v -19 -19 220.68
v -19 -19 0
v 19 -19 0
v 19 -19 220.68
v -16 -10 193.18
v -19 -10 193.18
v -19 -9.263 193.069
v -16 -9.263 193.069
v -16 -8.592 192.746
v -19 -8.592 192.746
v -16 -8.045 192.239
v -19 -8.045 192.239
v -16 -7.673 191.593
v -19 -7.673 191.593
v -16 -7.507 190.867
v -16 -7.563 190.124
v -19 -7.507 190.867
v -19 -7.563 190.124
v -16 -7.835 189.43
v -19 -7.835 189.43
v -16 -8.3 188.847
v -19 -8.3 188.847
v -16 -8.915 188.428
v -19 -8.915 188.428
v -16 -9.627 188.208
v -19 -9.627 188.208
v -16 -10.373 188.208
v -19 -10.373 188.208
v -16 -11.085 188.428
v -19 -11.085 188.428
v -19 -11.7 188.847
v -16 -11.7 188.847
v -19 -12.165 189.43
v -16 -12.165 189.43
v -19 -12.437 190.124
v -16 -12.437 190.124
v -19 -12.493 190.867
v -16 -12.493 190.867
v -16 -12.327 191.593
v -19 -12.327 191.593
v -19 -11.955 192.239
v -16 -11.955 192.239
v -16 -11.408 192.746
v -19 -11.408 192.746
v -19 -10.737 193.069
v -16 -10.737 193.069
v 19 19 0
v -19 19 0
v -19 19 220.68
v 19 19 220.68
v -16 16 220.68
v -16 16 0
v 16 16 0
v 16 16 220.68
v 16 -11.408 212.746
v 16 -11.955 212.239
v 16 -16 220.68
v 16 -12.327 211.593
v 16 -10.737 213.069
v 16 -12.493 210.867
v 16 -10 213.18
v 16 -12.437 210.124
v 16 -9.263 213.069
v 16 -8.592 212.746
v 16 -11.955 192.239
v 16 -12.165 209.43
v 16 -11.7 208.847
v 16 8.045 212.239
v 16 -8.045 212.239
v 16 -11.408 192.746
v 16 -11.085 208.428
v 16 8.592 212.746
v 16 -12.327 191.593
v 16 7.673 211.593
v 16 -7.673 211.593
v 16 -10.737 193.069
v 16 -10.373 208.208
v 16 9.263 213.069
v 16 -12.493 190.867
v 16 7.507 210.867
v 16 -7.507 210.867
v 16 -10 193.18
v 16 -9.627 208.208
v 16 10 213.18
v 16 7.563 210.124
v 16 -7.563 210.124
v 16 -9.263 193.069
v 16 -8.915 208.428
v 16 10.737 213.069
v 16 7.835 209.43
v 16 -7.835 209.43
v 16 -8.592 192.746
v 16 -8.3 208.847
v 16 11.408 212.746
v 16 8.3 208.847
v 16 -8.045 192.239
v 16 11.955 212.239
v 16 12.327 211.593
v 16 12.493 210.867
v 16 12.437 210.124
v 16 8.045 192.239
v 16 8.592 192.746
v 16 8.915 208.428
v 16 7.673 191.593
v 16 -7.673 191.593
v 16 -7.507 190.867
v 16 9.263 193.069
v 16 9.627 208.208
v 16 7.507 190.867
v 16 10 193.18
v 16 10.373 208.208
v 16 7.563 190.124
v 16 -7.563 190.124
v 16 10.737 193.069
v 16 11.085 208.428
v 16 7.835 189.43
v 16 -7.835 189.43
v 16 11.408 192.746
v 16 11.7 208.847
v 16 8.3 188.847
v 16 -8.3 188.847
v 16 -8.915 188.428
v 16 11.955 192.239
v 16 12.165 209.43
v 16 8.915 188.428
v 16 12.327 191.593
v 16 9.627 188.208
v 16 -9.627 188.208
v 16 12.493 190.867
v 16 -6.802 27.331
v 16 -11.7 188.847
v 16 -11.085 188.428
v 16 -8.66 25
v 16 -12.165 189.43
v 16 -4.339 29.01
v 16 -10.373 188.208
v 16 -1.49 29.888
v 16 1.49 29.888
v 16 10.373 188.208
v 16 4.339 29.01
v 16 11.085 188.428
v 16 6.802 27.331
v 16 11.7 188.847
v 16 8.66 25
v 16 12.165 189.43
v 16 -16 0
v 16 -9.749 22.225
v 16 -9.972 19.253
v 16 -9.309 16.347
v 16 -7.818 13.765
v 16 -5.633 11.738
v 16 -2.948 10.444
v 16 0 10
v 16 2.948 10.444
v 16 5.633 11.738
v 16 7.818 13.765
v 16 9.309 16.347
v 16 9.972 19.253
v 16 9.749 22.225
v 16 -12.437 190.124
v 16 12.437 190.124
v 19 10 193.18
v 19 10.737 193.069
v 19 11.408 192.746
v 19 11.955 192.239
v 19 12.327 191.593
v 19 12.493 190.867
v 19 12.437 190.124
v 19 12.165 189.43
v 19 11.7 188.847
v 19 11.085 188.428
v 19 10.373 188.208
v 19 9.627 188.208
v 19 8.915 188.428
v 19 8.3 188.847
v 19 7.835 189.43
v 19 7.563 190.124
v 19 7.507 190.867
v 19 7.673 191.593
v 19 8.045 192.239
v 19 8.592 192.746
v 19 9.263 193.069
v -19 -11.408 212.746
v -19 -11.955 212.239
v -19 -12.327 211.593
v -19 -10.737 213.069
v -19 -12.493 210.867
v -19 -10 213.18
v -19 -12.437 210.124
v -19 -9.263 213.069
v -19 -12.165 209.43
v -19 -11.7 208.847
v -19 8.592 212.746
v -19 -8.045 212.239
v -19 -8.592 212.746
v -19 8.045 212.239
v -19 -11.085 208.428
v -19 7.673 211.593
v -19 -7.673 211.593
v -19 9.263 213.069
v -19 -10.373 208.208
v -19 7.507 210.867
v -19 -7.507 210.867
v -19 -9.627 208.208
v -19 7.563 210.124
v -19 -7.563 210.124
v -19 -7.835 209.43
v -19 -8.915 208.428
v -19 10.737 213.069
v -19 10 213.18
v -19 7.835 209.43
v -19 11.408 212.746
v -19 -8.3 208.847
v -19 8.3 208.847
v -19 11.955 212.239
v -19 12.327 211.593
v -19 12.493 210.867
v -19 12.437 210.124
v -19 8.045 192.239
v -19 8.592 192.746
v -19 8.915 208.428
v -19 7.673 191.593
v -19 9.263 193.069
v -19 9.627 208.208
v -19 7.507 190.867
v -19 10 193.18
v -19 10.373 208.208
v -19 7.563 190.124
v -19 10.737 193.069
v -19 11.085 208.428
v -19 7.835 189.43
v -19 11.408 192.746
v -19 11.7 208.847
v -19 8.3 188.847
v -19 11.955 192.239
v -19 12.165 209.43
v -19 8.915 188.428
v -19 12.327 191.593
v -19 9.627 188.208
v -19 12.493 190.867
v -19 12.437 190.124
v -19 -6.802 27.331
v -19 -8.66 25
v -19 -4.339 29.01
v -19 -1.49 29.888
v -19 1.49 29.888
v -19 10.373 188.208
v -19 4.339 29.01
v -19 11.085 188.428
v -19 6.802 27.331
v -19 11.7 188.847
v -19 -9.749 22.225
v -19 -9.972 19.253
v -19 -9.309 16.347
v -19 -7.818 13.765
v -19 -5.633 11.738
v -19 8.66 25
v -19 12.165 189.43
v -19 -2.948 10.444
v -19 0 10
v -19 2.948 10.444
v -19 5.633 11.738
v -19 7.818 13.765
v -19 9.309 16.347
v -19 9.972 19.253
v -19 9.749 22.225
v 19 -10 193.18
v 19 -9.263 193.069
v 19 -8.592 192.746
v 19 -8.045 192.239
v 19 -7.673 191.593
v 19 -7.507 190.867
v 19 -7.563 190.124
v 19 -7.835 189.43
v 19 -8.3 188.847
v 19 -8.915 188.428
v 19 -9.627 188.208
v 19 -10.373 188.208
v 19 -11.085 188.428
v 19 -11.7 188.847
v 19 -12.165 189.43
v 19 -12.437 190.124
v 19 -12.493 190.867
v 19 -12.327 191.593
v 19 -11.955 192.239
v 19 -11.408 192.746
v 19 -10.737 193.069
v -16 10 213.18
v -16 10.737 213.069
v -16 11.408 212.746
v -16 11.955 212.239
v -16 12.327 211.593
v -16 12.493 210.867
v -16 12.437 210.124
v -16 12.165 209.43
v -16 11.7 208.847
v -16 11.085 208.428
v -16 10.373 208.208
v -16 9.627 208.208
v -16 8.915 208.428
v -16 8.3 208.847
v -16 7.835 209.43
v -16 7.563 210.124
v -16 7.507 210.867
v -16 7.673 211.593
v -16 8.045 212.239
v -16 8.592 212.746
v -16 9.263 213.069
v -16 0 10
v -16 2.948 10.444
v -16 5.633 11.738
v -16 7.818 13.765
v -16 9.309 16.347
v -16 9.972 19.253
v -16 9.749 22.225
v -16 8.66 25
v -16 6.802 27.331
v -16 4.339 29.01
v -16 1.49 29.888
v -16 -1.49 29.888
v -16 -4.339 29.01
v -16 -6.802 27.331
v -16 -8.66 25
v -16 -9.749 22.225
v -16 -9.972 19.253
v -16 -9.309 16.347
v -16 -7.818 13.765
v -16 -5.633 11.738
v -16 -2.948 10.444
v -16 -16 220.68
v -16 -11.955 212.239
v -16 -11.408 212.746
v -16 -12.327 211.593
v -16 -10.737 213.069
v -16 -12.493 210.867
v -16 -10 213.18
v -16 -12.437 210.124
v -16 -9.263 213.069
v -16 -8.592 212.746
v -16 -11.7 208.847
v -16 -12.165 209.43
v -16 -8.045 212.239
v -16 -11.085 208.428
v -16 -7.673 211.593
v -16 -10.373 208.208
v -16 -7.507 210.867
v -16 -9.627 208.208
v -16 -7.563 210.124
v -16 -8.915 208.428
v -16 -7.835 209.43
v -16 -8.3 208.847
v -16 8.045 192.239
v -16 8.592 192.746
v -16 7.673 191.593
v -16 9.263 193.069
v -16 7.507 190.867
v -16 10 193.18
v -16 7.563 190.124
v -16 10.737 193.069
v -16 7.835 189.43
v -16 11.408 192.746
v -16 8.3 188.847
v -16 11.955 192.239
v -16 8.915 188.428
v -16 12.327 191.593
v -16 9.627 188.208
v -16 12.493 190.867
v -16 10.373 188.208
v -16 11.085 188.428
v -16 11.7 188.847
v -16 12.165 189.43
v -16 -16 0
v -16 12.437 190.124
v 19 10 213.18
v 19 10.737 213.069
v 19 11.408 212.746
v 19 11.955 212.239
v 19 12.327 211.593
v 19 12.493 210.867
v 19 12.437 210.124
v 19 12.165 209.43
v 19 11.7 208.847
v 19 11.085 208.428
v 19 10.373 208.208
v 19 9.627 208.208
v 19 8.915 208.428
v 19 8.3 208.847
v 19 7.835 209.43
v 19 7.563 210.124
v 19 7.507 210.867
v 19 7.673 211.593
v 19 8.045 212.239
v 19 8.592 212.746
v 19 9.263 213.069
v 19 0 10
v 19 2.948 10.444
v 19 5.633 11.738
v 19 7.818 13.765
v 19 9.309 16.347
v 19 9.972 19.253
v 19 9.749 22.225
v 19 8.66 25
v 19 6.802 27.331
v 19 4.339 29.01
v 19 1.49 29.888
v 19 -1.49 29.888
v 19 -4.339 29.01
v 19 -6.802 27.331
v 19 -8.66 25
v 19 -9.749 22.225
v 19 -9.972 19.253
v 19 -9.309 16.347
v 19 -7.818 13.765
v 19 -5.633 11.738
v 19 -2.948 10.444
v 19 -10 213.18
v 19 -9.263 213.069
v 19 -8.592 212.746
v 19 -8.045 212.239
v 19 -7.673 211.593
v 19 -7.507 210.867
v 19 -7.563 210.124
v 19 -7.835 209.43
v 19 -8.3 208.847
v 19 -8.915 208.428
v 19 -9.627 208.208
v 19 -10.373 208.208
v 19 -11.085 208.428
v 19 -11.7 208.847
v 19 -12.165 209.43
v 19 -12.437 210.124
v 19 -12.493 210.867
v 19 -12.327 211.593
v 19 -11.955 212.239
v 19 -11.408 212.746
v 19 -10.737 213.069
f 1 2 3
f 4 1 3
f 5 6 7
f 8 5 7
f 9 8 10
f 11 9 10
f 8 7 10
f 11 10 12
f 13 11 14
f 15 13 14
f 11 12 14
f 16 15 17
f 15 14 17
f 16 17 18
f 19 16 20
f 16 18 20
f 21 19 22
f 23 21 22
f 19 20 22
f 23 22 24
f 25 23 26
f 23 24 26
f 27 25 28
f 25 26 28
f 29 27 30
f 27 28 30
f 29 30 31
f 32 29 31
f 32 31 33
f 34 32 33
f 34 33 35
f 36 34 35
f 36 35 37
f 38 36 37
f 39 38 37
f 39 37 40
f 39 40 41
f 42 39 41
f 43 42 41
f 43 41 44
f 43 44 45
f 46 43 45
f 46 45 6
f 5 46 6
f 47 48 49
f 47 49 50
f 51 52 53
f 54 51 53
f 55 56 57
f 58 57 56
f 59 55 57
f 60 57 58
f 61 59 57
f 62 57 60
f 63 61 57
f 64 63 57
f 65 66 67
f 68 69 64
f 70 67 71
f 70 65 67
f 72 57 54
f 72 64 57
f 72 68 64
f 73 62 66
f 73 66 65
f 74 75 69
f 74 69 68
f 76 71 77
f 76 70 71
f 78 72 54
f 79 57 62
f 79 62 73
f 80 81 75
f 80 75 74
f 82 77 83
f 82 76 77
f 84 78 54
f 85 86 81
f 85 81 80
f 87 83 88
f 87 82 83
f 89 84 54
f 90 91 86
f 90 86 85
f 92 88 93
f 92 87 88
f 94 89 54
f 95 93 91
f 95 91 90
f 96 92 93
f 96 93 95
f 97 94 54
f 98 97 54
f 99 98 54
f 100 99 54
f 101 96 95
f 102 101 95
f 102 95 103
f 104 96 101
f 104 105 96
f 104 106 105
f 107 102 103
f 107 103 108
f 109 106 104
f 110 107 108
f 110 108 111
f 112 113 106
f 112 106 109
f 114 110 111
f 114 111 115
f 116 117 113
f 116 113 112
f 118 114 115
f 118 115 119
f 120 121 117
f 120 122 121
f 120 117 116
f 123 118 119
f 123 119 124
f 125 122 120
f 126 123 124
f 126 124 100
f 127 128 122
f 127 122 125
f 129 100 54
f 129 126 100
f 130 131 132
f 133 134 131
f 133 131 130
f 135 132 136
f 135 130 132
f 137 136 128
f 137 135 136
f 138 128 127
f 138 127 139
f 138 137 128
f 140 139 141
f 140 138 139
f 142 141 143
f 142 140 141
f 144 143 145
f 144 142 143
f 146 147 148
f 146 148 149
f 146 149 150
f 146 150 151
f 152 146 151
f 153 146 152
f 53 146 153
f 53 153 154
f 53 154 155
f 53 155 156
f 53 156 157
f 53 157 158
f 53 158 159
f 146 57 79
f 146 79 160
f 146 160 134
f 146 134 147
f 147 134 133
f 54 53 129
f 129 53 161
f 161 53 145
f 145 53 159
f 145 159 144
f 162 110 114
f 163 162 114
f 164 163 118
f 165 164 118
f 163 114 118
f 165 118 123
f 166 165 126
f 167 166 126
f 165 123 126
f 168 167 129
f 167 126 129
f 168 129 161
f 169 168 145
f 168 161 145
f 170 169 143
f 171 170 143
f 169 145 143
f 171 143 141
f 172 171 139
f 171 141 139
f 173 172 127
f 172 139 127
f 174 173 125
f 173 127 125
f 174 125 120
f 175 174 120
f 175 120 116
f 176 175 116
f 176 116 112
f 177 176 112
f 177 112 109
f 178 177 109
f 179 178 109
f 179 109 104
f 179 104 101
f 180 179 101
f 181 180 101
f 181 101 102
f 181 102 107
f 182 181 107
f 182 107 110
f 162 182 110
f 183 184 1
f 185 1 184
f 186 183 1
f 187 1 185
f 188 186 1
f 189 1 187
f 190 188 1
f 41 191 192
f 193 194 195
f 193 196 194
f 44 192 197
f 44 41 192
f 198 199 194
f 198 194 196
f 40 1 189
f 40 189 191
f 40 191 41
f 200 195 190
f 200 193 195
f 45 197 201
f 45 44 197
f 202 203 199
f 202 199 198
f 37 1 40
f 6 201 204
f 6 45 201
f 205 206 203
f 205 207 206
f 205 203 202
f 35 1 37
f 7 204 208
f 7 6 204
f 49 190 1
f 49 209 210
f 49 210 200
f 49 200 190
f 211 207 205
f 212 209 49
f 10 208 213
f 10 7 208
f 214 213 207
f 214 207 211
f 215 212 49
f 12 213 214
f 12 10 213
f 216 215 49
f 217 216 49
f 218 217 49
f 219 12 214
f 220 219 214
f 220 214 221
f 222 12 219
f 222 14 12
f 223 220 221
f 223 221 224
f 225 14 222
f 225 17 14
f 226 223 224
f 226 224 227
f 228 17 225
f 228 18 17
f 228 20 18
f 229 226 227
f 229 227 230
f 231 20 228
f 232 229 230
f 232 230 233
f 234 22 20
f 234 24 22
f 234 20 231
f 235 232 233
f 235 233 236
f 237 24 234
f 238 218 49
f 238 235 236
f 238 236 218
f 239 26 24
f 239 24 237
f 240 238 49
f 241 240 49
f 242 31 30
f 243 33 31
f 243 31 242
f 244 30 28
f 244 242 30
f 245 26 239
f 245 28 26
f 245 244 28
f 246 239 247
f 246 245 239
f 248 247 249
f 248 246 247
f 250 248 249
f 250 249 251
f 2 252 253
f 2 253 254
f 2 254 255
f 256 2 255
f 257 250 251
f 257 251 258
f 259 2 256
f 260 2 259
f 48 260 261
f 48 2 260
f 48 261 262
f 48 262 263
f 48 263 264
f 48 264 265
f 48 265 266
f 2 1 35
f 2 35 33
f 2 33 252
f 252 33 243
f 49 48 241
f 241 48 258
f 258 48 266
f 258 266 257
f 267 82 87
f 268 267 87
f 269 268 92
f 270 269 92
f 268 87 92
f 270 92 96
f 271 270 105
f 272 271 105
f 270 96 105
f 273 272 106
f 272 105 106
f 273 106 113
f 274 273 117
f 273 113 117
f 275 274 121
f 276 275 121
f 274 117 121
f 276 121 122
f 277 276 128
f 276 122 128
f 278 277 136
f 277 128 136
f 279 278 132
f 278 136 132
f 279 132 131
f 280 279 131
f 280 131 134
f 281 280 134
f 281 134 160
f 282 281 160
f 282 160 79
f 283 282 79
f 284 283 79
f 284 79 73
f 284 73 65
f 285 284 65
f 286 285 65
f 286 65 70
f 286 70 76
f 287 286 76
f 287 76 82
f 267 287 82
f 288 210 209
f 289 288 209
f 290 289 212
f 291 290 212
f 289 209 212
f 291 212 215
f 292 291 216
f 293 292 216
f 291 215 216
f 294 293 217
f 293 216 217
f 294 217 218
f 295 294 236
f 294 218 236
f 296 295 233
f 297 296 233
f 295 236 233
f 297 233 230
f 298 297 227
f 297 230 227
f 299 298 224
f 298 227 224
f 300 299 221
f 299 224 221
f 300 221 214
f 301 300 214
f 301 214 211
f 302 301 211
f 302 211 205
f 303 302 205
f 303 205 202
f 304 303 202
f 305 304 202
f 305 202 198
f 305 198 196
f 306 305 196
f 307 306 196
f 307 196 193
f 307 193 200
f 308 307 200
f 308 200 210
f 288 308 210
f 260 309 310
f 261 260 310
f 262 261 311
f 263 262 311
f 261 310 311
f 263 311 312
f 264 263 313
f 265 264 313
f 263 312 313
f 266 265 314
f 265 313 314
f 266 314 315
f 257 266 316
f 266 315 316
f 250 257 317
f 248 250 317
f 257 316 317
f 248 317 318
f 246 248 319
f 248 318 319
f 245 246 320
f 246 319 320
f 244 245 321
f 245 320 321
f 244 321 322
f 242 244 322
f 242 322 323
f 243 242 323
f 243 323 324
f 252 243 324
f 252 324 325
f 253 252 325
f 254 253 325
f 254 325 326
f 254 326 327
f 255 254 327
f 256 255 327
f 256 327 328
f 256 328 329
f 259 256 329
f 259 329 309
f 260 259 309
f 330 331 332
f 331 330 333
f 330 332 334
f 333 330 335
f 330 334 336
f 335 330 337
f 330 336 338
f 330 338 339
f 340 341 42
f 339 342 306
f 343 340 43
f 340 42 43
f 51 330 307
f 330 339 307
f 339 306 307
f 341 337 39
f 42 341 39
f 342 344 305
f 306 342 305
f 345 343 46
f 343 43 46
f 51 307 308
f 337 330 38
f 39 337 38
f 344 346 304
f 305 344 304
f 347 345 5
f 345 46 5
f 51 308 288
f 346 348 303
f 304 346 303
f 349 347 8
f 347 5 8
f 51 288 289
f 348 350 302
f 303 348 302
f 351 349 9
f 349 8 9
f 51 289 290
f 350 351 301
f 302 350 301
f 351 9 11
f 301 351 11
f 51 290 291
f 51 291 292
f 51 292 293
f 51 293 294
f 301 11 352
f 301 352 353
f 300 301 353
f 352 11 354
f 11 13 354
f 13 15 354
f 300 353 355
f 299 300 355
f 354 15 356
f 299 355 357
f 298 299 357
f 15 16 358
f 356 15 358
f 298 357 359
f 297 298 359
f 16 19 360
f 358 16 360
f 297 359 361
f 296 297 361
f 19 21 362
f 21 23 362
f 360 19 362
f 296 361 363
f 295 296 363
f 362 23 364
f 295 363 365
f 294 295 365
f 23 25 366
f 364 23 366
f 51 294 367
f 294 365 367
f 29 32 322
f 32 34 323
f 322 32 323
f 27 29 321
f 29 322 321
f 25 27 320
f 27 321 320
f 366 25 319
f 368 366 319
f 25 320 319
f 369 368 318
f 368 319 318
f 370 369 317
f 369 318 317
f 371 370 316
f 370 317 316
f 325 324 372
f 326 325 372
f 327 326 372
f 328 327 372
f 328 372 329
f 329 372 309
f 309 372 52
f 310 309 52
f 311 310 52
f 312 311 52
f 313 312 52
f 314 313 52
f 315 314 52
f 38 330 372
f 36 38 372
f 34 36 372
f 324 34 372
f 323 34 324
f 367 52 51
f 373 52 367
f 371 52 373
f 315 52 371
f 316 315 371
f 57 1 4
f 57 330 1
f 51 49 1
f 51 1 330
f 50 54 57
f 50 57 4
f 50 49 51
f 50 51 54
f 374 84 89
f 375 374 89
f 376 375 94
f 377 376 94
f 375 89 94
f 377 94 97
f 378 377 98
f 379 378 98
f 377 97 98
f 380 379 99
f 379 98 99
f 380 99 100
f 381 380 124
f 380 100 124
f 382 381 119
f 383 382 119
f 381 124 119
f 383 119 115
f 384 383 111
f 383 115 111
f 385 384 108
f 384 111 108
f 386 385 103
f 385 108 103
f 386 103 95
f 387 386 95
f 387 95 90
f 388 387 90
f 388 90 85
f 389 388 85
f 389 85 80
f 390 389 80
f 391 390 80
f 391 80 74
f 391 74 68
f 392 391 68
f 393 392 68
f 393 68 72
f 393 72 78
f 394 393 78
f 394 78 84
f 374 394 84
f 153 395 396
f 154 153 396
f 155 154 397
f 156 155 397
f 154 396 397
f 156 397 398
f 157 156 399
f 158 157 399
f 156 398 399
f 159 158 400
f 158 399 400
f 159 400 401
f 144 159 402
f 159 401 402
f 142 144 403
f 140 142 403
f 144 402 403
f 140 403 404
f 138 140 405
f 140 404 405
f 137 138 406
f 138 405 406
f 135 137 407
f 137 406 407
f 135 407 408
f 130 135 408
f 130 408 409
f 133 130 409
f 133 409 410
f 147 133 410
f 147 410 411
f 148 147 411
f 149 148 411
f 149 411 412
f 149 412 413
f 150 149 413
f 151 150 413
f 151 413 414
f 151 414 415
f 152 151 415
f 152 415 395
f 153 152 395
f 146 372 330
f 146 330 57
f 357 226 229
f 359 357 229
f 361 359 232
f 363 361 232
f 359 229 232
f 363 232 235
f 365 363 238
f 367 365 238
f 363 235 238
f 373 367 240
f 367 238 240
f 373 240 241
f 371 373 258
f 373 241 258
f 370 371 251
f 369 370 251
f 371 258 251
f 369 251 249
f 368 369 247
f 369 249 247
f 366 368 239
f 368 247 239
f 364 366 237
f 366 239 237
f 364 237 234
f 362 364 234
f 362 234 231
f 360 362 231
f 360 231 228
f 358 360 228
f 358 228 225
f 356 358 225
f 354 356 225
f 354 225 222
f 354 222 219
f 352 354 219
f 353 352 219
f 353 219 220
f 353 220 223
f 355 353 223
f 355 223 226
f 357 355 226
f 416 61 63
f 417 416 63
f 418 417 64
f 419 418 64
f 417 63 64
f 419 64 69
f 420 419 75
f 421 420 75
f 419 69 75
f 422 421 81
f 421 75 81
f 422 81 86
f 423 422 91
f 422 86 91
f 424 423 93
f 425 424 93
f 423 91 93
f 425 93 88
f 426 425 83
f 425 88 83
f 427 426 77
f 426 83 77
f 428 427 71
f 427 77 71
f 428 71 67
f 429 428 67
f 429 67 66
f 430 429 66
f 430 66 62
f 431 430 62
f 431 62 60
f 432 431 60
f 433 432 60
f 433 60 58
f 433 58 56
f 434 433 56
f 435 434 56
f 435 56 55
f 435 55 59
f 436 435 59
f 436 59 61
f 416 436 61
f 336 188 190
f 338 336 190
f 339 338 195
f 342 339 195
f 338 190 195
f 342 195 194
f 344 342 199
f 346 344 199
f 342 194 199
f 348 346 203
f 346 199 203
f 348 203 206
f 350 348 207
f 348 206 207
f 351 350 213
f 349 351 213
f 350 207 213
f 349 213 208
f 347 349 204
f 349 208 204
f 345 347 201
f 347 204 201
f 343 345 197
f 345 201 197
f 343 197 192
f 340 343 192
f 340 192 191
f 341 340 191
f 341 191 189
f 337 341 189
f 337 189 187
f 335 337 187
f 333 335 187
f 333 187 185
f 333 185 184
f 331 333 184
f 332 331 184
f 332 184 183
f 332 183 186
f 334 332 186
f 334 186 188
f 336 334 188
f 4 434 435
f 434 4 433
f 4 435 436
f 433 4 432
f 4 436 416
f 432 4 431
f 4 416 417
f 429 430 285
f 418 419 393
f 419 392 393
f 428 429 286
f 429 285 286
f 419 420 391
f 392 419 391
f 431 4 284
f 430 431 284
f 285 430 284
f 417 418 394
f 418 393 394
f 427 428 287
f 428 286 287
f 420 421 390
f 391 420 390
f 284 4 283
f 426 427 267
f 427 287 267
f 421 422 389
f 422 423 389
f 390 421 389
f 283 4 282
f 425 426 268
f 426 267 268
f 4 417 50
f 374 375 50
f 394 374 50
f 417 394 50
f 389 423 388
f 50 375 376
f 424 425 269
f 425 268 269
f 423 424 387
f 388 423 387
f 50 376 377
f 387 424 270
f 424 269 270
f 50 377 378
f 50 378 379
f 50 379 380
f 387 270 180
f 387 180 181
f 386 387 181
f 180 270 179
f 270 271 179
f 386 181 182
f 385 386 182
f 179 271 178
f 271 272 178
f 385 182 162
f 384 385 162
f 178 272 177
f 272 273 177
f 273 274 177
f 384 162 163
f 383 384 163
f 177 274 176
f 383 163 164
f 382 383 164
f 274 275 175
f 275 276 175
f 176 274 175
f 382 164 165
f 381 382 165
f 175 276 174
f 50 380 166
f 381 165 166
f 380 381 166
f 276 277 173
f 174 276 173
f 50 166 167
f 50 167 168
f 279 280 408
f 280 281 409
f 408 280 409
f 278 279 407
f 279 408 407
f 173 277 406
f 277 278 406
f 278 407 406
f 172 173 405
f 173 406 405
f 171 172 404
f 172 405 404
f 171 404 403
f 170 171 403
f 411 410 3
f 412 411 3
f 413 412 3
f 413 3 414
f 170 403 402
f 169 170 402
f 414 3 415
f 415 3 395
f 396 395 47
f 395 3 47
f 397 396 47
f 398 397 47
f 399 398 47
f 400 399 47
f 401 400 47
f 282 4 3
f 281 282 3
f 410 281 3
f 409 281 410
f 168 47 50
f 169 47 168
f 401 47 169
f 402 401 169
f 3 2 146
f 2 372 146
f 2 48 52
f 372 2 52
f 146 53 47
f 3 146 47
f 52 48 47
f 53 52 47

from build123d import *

# Parameters (mm, degrees)
SKETCH1_W               = 38
SKETCH1_H               = 38
SKETCH1_W_2             = 32
SKETCH1_H_2             = 32
BOSS_EXTRUDE1_DEPTH     = 220.68
SKETCH2_R               = 2.5
CUT_EXTRUDE1_DEPTH      = 1
CUT_EXTRUDE1_DEPTH_BACK = 39
SKETCH3_R               = 10
CUT_EXTRUDE2_DEPTH      = 39


with BuildPart() as part:
    # Sketch1 → Boss-Extrude1 (new body)
    with BuildSketch(Plane.XY):
        Rectangle(SKETCH1_W, SKETCH1_H)
        Rectangle(SKETCH1_W_2, SKETCH1_H_2, mode=Mode.SUBTRACT)
    extrude(amount=BOSS_EXTRUDE1_DEPTH)

    # Sketch2 → Cut-Extrude1 (cut, two sides)
    with BuildSketch(Plane.ZY.offset(19)) as cut_extrude1_sk:
        with Locations((190.68, -10)):
            Circle(SKETCH2_R)
        with Locations((210.68, -10)):
            Circle(SKETCH2_R)
        with Locations((190.68, 10)):
            Circle(SKETCH2_R)
        with Locations((210.68, 10)):
            Circle(SKETCH2_R)
    extrude(amount=CUT_EXTRUDE1_DEPTH, mode=Mode.SUBTRACT)
    extrude(cut_extrude1_sk.sketch, amount=-CUT_EXTRUDE1_DEPTH_BACK, mode=Mode.SUBTRACT)

    # Sketch3 → Cut-Extrude2 (cut, through all)
    with BuildSketch(Plane(origin=(19, 0, 0), x_dir=(0, 0, -1), z_dir=(1, 0, 0))):
        with Locations((-20, 0)):
            Circle(SKETCH3_R)
    extrude(amount=-CUT_EXTRUDE2_DEPTH, mode=Mode.SUBTRACT)


solid = part.part
